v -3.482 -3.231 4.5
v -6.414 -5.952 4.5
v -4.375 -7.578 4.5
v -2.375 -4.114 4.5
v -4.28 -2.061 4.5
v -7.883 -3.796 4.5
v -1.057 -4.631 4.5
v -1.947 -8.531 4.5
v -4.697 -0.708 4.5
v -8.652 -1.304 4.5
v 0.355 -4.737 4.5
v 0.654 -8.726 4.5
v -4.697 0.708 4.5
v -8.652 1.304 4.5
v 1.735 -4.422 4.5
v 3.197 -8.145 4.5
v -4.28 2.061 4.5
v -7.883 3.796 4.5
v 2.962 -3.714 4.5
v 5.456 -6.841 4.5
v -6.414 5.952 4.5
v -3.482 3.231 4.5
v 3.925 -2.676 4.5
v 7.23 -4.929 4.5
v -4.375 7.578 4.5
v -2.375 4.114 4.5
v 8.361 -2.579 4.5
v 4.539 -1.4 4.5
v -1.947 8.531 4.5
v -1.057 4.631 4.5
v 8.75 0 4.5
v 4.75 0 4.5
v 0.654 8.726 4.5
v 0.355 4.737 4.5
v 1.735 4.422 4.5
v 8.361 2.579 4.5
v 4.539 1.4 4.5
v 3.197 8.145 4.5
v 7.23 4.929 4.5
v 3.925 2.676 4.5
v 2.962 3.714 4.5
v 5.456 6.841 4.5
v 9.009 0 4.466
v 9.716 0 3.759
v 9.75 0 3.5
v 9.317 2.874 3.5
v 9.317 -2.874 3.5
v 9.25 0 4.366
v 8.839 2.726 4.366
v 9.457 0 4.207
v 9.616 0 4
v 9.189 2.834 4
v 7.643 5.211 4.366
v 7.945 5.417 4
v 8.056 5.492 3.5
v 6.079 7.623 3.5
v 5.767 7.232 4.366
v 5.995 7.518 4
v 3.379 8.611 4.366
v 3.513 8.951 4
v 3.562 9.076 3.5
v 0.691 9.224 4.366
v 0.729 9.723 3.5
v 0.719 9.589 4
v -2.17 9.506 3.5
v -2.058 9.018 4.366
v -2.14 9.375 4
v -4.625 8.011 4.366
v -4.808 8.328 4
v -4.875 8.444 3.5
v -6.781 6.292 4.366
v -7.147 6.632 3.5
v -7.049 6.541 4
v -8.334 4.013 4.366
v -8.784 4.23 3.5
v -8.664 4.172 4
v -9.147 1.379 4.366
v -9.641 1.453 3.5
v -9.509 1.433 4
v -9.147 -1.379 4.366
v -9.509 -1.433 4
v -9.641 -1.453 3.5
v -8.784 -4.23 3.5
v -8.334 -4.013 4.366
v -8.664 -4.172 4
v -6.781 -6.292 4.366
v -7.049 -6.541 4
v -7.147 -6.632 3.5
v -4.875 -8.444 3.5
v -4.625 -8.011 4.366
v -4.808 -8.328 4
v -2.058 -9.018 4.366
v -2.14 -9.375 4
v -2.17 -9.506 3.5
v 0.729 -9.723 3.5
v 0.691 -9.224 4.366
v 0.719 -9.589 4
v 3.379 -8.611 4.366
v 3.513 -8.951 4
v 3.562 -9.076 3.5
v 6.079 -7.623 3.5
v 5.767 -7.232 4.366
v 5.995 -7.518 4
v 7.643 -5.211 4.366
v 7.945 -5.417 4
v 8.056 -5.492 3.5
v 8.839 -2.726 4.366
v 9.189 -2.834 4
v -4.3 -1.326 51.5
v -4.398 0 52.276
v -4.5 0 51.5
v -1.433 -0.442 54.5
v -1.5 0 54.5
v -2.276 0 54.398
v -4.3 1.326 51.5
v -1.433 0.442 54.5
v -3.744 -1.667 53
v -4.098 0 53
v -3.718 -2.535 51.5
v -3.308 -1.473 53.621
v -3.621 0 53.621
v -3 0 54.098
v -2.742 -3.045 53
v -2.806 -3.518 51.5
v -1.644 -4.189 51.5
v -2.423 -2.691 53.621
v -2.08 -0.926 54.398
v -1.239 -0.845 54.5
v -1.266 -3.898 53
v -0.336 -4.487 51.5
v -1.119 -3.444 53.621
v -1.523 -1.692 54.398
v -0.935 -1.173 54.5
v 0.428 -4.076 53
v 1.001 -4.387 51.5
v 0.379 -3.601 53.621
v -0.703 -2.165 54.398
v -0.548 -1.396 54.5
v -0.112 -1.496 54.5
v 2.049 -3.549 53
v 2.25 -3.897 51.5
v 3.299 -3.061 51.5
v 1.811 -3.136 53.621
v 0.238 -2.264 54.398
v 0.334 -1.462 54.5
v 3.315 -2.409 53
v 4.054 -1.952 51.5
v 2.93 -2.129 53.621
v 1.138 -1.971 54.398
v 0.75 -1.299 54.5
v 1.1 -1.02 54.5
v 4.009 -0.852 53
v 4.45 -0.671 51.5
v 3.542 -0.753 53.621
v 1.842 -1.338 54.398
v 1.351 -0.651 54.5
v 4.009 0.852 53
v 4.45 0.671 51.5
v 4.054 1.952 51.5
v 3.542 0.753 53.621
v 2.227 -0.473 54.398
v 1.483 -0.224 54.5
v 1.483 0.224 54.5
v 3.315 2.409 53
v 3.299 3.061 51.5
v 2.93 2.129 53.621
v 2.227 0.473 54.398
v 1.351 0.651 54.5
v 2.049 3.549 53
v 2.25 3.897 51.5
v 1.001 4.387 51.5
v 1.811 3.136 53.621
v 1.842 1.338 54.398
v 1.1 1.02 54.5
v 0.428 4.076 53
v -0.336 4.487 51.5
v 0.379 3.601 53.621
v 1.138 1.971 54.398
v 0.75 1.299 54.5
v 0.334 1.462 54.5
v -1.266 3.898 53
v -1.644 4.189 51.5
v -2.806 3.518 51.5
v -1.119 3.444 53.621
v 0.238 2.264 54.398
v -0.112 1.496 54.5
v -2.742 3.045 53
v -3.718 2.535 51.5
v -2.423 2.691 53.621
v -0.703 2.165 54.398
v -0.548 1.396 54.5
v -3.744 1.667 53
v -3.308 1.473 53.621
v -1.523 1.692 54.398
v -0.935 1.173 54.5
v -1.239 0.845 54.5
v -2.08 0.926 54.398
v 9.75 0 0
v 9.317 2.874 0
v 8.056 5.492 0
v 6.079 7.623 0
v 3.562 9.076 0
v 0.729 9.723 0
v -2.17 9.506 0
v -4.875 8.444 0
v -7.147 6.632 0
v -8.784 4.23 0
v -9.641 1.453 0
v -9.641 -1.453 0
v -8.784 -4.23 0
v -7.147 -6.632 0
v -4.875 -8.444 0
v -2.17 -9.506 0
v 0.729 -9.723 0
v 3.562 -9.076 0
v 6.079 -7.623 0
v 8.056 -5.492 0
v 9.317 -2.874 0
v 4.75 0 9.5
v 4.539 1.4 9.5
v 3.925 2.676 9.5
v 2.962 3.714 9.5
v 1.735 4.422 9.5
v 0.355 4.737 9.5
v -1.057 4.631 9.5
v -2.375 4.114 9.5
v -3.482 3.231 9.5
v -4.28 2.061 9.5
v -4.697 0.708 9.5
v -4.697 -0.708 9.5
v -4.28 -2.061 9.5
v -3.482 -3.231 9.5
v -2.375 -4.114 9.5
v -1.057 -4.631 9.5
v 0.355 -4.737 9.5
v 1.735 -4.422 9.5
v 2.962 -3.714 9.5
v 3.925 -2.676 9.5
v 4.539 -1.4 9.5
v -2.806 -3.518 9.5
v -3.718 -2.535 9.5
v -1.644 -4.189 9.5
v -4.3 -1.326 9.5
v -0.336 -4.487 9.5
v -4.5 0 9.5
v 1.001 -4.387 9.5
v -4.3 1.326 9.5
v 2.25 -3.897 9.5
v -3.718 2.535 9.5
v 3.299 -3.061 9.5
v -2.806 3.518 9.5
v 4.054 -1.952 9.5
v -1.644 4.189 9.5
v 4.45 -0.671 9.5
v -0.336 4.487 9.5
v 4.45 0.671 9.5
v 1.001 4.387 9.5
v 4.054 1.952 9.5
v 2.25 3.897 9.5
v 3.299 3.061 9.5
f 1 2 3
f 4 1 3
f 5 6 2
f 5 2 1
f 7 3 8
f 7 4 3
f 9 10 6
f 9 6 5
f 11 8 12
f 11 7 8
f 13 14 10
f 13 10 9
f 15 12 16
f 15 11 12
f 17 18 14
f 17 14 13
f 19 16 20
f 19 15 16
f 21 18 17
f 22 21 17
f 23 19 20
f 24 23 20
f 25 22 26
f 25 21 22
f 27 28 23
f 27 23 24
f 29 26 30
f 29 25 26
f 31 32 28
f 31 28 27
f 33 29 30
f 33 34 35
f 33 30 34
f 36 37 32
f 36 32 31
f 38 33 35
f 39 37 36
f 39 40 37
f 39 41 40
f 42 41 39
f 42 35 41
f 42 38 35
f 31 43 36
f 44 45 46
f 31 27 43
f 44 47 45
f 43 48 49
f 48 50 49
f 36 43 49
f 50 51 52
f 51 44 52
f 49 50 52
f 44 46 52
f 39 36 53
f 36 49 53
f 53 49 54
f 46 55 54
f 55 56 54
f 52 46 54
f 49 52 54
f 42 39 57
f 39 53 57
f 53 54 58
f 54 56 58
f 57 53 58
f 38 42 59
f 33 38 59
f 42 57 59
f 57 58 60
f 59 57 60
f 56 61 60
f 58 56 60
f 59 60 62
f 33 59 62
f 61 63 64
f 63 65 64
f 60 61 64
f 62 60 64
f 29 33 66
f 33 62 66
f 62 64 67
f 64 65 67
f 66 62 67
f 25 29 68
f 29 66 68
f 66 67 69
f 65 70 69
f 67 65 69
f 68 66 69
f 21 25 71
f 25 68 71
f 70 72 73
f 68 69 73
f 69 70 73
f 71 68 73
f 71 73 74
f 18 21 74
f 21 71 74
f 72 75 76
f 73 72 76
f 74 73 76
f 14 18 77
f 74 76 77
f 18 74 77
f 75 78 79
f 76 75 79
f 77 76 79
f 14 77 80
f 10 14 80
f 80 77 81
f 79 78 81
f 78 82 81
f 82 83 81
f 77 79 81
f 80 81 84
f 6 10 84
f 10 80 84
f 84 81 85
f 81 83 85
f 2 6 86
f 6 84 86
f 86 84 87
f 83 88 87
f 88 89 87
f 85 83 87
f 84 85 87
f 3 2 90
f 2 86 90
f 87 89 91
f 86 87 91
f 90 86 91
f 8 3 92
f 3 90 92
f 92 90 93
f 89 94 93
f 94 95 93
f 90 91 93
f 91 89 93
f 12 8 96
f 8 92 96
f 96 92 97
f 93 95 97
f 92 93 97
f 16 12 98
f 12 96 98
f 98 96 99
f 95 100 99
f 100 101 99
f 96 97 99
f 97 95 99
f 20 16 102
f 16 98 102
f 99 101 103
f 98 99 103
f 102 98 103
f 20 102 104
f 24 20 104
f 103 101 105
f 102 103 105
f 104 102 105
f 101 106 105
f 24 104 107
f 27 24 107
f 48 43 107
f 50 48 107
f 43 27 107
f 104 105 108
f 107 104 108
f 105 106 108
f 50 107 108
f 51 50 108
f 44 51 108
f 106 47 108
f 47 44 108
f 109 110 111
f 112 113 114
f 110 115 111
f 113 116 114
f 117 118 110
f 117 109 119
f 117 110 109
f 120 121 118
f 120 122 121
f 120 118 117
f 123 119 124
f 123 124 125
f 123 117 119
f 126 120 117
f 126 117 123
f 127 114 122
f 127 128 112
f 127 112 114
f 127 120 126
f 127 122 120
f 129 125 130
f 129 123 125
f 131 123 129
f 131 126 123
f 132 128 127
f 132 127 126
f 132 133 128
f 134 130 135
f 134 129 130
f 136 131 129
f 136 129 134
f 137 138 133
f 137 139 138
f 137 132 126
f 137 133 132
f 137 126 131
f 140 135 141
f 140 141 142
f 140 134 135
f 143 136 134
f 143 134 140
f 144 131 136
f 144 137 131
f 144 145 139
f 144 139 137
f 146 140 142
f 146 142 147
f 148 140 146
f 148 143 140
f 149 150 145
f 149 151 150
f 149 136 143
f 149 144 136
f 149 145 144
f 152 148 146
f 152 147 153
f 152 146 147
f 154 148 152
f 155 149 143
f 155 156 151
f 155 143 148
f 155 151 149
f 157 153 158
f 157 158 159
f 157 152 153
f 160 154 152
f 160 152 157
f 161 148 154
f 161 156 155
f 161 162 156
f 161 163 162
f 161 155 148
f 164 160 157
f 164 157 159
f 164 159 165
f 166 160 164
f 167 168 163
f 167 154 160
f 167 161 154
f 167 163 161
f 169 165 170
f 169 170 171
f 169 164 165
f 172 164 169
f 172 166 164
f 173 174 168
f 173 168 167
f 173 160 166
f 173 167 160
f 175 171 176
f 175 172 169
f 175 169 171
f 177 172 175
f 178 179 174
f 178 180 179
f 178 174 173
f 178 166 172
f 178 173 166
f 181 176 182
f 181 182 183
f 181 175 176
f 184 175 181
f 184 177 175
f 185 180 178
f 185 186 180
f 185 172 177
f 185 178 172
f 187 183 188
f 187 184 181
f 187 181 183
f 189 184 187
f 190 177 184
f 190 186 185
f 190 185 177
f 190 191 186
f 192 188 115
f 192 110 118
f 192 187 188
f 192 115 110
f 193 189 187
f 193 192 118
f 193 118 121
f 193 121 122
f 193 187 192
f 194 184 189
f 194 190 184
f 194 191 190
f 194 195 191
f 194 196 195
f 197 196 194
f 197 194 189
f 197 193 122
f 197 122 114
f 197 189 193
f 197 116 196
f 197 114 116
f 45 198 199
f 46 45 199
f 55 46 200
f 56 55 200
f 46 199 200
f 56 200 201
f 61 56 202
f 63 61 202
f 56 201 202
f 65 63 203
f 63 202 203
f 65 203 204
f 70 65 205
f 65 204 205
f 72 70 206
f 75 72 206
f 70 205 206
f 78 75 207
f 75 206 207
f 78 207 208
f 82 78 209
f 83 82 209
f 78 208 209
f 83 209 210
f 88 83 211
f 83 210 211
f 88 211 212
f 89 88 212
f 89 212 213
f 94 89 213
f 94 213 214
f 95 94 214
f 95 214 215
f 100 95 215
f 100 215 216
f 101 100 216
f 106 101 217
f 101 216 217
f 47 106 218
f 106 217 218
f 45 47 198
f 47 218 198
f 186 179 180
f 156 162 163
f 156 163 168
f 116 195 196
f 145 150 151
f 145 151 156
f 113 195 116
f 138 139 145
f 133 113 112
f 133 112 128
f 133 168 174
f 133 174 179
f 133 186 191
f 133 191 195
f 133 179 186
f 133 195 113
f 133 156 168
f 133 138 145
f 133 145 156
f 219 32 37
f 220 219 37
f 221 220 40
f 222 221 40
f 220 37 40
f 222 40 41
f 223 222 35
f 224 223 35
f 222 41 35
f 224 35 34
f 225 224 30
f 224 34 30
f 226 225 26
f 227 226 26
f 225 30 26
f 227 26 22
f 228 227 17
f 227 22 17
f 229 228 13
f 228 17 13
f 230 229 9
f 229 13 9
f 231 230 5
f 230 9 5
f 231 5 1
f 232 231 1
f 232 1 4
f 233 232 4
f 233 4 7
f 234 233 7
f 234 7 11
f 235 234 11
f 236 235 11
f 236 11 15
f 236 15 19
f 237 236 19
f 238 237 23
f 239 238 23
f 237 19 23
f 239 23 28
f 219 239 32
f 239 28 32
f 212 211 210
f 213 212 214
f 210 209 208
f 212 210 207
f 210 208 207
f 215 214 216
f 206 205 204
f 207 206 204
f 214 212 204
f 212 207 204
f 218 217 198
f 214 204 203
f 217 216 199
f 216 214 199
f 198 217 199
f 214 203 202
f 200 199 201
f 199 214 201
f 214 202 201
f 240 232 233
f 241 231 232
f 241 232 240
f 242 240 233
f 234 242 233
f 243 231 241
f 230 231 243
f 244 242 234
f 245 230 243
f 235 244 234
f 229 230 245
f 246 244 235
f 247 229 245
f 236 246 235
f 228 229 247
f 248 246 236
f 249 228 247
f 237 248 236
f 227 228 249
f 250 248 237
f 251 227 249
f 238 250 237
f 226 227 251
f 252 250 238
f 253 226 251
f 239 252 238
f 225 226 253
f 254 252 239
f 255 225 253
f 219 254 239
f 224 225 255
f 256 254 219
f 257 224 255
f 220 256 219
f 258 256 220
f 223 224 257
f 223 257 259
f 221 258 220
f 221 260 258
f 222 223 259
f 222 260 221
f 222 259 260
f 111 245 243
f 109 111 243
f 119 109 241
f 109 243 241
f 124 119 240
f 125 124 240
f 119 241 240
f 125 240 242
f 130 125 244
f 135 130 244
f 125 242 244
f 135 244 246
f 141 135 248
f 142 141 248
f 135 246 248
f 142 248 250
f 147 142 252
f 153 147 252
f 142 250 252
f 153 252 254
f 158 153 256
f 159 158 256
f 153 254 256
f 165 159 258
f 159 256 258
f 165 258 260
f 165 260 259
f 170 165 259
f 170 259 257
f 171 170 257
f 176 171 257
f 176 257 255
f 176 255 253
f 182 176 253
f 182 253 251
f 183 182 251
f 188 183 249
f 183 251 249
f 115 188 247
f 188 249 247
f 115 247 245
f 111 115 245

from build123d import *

# Parameters (mm, degrees)
SKETCH1_R           = 9.75
BOSS_EXTRUDE1_DEPTH = 4.5
SKETCH2_R           = 4.75
BOSS_EXTRUDE2_DEPTH = 5
SKETCH3_R           = 4.5
BOSS_EXTRUDE3_DEPTH = 45
FILLET3_R           = 3
FILLET4_R           = 1


with BuildPart() as part:
    # Sketch1 → Boss-Extrude1 (new body)
    with BuildSketch(Plane.XY):
        Circle(SKETCH1_R)
    extrude(amount=BOSS_EXTRUDE1_DEPTH)

    # Sketch2 → Boss-Extrude2 (add)
    with BuildSketch(Plane.XY.offset(4.5)):
        Circle(SKETCH2_R)
    extrude(amount=BOSS_EXTRUDE2_DEPTH)

    # Sketch3 → Boss-Extrude3 (add)
    with BuildSketch(Plane.XY.offset(9.5)):
        with Locations(Location((0, 0, 0), (0, 0, 180))):
            Circle(SKETCH3_R)
    extrude(amount=BOSS_EXTRUDE3_DEPTH)

    # Fillet3
    fillet3_edges = [part.edges().sort_by_distance(p)[0] for p in [
        (4.5, 0, 54.5),
    ]]
    fillet(fillet3_edges, radius=FILLET3_R)

    # Fillet4
    fillet4_edges = [part.edges().sort_by_distance(p)[0] for p in [
        (-9.75, 0, 4.5),
    ]]
    fillet(fillet4_edges, radius=FILLET4_R)


solid = part.part
